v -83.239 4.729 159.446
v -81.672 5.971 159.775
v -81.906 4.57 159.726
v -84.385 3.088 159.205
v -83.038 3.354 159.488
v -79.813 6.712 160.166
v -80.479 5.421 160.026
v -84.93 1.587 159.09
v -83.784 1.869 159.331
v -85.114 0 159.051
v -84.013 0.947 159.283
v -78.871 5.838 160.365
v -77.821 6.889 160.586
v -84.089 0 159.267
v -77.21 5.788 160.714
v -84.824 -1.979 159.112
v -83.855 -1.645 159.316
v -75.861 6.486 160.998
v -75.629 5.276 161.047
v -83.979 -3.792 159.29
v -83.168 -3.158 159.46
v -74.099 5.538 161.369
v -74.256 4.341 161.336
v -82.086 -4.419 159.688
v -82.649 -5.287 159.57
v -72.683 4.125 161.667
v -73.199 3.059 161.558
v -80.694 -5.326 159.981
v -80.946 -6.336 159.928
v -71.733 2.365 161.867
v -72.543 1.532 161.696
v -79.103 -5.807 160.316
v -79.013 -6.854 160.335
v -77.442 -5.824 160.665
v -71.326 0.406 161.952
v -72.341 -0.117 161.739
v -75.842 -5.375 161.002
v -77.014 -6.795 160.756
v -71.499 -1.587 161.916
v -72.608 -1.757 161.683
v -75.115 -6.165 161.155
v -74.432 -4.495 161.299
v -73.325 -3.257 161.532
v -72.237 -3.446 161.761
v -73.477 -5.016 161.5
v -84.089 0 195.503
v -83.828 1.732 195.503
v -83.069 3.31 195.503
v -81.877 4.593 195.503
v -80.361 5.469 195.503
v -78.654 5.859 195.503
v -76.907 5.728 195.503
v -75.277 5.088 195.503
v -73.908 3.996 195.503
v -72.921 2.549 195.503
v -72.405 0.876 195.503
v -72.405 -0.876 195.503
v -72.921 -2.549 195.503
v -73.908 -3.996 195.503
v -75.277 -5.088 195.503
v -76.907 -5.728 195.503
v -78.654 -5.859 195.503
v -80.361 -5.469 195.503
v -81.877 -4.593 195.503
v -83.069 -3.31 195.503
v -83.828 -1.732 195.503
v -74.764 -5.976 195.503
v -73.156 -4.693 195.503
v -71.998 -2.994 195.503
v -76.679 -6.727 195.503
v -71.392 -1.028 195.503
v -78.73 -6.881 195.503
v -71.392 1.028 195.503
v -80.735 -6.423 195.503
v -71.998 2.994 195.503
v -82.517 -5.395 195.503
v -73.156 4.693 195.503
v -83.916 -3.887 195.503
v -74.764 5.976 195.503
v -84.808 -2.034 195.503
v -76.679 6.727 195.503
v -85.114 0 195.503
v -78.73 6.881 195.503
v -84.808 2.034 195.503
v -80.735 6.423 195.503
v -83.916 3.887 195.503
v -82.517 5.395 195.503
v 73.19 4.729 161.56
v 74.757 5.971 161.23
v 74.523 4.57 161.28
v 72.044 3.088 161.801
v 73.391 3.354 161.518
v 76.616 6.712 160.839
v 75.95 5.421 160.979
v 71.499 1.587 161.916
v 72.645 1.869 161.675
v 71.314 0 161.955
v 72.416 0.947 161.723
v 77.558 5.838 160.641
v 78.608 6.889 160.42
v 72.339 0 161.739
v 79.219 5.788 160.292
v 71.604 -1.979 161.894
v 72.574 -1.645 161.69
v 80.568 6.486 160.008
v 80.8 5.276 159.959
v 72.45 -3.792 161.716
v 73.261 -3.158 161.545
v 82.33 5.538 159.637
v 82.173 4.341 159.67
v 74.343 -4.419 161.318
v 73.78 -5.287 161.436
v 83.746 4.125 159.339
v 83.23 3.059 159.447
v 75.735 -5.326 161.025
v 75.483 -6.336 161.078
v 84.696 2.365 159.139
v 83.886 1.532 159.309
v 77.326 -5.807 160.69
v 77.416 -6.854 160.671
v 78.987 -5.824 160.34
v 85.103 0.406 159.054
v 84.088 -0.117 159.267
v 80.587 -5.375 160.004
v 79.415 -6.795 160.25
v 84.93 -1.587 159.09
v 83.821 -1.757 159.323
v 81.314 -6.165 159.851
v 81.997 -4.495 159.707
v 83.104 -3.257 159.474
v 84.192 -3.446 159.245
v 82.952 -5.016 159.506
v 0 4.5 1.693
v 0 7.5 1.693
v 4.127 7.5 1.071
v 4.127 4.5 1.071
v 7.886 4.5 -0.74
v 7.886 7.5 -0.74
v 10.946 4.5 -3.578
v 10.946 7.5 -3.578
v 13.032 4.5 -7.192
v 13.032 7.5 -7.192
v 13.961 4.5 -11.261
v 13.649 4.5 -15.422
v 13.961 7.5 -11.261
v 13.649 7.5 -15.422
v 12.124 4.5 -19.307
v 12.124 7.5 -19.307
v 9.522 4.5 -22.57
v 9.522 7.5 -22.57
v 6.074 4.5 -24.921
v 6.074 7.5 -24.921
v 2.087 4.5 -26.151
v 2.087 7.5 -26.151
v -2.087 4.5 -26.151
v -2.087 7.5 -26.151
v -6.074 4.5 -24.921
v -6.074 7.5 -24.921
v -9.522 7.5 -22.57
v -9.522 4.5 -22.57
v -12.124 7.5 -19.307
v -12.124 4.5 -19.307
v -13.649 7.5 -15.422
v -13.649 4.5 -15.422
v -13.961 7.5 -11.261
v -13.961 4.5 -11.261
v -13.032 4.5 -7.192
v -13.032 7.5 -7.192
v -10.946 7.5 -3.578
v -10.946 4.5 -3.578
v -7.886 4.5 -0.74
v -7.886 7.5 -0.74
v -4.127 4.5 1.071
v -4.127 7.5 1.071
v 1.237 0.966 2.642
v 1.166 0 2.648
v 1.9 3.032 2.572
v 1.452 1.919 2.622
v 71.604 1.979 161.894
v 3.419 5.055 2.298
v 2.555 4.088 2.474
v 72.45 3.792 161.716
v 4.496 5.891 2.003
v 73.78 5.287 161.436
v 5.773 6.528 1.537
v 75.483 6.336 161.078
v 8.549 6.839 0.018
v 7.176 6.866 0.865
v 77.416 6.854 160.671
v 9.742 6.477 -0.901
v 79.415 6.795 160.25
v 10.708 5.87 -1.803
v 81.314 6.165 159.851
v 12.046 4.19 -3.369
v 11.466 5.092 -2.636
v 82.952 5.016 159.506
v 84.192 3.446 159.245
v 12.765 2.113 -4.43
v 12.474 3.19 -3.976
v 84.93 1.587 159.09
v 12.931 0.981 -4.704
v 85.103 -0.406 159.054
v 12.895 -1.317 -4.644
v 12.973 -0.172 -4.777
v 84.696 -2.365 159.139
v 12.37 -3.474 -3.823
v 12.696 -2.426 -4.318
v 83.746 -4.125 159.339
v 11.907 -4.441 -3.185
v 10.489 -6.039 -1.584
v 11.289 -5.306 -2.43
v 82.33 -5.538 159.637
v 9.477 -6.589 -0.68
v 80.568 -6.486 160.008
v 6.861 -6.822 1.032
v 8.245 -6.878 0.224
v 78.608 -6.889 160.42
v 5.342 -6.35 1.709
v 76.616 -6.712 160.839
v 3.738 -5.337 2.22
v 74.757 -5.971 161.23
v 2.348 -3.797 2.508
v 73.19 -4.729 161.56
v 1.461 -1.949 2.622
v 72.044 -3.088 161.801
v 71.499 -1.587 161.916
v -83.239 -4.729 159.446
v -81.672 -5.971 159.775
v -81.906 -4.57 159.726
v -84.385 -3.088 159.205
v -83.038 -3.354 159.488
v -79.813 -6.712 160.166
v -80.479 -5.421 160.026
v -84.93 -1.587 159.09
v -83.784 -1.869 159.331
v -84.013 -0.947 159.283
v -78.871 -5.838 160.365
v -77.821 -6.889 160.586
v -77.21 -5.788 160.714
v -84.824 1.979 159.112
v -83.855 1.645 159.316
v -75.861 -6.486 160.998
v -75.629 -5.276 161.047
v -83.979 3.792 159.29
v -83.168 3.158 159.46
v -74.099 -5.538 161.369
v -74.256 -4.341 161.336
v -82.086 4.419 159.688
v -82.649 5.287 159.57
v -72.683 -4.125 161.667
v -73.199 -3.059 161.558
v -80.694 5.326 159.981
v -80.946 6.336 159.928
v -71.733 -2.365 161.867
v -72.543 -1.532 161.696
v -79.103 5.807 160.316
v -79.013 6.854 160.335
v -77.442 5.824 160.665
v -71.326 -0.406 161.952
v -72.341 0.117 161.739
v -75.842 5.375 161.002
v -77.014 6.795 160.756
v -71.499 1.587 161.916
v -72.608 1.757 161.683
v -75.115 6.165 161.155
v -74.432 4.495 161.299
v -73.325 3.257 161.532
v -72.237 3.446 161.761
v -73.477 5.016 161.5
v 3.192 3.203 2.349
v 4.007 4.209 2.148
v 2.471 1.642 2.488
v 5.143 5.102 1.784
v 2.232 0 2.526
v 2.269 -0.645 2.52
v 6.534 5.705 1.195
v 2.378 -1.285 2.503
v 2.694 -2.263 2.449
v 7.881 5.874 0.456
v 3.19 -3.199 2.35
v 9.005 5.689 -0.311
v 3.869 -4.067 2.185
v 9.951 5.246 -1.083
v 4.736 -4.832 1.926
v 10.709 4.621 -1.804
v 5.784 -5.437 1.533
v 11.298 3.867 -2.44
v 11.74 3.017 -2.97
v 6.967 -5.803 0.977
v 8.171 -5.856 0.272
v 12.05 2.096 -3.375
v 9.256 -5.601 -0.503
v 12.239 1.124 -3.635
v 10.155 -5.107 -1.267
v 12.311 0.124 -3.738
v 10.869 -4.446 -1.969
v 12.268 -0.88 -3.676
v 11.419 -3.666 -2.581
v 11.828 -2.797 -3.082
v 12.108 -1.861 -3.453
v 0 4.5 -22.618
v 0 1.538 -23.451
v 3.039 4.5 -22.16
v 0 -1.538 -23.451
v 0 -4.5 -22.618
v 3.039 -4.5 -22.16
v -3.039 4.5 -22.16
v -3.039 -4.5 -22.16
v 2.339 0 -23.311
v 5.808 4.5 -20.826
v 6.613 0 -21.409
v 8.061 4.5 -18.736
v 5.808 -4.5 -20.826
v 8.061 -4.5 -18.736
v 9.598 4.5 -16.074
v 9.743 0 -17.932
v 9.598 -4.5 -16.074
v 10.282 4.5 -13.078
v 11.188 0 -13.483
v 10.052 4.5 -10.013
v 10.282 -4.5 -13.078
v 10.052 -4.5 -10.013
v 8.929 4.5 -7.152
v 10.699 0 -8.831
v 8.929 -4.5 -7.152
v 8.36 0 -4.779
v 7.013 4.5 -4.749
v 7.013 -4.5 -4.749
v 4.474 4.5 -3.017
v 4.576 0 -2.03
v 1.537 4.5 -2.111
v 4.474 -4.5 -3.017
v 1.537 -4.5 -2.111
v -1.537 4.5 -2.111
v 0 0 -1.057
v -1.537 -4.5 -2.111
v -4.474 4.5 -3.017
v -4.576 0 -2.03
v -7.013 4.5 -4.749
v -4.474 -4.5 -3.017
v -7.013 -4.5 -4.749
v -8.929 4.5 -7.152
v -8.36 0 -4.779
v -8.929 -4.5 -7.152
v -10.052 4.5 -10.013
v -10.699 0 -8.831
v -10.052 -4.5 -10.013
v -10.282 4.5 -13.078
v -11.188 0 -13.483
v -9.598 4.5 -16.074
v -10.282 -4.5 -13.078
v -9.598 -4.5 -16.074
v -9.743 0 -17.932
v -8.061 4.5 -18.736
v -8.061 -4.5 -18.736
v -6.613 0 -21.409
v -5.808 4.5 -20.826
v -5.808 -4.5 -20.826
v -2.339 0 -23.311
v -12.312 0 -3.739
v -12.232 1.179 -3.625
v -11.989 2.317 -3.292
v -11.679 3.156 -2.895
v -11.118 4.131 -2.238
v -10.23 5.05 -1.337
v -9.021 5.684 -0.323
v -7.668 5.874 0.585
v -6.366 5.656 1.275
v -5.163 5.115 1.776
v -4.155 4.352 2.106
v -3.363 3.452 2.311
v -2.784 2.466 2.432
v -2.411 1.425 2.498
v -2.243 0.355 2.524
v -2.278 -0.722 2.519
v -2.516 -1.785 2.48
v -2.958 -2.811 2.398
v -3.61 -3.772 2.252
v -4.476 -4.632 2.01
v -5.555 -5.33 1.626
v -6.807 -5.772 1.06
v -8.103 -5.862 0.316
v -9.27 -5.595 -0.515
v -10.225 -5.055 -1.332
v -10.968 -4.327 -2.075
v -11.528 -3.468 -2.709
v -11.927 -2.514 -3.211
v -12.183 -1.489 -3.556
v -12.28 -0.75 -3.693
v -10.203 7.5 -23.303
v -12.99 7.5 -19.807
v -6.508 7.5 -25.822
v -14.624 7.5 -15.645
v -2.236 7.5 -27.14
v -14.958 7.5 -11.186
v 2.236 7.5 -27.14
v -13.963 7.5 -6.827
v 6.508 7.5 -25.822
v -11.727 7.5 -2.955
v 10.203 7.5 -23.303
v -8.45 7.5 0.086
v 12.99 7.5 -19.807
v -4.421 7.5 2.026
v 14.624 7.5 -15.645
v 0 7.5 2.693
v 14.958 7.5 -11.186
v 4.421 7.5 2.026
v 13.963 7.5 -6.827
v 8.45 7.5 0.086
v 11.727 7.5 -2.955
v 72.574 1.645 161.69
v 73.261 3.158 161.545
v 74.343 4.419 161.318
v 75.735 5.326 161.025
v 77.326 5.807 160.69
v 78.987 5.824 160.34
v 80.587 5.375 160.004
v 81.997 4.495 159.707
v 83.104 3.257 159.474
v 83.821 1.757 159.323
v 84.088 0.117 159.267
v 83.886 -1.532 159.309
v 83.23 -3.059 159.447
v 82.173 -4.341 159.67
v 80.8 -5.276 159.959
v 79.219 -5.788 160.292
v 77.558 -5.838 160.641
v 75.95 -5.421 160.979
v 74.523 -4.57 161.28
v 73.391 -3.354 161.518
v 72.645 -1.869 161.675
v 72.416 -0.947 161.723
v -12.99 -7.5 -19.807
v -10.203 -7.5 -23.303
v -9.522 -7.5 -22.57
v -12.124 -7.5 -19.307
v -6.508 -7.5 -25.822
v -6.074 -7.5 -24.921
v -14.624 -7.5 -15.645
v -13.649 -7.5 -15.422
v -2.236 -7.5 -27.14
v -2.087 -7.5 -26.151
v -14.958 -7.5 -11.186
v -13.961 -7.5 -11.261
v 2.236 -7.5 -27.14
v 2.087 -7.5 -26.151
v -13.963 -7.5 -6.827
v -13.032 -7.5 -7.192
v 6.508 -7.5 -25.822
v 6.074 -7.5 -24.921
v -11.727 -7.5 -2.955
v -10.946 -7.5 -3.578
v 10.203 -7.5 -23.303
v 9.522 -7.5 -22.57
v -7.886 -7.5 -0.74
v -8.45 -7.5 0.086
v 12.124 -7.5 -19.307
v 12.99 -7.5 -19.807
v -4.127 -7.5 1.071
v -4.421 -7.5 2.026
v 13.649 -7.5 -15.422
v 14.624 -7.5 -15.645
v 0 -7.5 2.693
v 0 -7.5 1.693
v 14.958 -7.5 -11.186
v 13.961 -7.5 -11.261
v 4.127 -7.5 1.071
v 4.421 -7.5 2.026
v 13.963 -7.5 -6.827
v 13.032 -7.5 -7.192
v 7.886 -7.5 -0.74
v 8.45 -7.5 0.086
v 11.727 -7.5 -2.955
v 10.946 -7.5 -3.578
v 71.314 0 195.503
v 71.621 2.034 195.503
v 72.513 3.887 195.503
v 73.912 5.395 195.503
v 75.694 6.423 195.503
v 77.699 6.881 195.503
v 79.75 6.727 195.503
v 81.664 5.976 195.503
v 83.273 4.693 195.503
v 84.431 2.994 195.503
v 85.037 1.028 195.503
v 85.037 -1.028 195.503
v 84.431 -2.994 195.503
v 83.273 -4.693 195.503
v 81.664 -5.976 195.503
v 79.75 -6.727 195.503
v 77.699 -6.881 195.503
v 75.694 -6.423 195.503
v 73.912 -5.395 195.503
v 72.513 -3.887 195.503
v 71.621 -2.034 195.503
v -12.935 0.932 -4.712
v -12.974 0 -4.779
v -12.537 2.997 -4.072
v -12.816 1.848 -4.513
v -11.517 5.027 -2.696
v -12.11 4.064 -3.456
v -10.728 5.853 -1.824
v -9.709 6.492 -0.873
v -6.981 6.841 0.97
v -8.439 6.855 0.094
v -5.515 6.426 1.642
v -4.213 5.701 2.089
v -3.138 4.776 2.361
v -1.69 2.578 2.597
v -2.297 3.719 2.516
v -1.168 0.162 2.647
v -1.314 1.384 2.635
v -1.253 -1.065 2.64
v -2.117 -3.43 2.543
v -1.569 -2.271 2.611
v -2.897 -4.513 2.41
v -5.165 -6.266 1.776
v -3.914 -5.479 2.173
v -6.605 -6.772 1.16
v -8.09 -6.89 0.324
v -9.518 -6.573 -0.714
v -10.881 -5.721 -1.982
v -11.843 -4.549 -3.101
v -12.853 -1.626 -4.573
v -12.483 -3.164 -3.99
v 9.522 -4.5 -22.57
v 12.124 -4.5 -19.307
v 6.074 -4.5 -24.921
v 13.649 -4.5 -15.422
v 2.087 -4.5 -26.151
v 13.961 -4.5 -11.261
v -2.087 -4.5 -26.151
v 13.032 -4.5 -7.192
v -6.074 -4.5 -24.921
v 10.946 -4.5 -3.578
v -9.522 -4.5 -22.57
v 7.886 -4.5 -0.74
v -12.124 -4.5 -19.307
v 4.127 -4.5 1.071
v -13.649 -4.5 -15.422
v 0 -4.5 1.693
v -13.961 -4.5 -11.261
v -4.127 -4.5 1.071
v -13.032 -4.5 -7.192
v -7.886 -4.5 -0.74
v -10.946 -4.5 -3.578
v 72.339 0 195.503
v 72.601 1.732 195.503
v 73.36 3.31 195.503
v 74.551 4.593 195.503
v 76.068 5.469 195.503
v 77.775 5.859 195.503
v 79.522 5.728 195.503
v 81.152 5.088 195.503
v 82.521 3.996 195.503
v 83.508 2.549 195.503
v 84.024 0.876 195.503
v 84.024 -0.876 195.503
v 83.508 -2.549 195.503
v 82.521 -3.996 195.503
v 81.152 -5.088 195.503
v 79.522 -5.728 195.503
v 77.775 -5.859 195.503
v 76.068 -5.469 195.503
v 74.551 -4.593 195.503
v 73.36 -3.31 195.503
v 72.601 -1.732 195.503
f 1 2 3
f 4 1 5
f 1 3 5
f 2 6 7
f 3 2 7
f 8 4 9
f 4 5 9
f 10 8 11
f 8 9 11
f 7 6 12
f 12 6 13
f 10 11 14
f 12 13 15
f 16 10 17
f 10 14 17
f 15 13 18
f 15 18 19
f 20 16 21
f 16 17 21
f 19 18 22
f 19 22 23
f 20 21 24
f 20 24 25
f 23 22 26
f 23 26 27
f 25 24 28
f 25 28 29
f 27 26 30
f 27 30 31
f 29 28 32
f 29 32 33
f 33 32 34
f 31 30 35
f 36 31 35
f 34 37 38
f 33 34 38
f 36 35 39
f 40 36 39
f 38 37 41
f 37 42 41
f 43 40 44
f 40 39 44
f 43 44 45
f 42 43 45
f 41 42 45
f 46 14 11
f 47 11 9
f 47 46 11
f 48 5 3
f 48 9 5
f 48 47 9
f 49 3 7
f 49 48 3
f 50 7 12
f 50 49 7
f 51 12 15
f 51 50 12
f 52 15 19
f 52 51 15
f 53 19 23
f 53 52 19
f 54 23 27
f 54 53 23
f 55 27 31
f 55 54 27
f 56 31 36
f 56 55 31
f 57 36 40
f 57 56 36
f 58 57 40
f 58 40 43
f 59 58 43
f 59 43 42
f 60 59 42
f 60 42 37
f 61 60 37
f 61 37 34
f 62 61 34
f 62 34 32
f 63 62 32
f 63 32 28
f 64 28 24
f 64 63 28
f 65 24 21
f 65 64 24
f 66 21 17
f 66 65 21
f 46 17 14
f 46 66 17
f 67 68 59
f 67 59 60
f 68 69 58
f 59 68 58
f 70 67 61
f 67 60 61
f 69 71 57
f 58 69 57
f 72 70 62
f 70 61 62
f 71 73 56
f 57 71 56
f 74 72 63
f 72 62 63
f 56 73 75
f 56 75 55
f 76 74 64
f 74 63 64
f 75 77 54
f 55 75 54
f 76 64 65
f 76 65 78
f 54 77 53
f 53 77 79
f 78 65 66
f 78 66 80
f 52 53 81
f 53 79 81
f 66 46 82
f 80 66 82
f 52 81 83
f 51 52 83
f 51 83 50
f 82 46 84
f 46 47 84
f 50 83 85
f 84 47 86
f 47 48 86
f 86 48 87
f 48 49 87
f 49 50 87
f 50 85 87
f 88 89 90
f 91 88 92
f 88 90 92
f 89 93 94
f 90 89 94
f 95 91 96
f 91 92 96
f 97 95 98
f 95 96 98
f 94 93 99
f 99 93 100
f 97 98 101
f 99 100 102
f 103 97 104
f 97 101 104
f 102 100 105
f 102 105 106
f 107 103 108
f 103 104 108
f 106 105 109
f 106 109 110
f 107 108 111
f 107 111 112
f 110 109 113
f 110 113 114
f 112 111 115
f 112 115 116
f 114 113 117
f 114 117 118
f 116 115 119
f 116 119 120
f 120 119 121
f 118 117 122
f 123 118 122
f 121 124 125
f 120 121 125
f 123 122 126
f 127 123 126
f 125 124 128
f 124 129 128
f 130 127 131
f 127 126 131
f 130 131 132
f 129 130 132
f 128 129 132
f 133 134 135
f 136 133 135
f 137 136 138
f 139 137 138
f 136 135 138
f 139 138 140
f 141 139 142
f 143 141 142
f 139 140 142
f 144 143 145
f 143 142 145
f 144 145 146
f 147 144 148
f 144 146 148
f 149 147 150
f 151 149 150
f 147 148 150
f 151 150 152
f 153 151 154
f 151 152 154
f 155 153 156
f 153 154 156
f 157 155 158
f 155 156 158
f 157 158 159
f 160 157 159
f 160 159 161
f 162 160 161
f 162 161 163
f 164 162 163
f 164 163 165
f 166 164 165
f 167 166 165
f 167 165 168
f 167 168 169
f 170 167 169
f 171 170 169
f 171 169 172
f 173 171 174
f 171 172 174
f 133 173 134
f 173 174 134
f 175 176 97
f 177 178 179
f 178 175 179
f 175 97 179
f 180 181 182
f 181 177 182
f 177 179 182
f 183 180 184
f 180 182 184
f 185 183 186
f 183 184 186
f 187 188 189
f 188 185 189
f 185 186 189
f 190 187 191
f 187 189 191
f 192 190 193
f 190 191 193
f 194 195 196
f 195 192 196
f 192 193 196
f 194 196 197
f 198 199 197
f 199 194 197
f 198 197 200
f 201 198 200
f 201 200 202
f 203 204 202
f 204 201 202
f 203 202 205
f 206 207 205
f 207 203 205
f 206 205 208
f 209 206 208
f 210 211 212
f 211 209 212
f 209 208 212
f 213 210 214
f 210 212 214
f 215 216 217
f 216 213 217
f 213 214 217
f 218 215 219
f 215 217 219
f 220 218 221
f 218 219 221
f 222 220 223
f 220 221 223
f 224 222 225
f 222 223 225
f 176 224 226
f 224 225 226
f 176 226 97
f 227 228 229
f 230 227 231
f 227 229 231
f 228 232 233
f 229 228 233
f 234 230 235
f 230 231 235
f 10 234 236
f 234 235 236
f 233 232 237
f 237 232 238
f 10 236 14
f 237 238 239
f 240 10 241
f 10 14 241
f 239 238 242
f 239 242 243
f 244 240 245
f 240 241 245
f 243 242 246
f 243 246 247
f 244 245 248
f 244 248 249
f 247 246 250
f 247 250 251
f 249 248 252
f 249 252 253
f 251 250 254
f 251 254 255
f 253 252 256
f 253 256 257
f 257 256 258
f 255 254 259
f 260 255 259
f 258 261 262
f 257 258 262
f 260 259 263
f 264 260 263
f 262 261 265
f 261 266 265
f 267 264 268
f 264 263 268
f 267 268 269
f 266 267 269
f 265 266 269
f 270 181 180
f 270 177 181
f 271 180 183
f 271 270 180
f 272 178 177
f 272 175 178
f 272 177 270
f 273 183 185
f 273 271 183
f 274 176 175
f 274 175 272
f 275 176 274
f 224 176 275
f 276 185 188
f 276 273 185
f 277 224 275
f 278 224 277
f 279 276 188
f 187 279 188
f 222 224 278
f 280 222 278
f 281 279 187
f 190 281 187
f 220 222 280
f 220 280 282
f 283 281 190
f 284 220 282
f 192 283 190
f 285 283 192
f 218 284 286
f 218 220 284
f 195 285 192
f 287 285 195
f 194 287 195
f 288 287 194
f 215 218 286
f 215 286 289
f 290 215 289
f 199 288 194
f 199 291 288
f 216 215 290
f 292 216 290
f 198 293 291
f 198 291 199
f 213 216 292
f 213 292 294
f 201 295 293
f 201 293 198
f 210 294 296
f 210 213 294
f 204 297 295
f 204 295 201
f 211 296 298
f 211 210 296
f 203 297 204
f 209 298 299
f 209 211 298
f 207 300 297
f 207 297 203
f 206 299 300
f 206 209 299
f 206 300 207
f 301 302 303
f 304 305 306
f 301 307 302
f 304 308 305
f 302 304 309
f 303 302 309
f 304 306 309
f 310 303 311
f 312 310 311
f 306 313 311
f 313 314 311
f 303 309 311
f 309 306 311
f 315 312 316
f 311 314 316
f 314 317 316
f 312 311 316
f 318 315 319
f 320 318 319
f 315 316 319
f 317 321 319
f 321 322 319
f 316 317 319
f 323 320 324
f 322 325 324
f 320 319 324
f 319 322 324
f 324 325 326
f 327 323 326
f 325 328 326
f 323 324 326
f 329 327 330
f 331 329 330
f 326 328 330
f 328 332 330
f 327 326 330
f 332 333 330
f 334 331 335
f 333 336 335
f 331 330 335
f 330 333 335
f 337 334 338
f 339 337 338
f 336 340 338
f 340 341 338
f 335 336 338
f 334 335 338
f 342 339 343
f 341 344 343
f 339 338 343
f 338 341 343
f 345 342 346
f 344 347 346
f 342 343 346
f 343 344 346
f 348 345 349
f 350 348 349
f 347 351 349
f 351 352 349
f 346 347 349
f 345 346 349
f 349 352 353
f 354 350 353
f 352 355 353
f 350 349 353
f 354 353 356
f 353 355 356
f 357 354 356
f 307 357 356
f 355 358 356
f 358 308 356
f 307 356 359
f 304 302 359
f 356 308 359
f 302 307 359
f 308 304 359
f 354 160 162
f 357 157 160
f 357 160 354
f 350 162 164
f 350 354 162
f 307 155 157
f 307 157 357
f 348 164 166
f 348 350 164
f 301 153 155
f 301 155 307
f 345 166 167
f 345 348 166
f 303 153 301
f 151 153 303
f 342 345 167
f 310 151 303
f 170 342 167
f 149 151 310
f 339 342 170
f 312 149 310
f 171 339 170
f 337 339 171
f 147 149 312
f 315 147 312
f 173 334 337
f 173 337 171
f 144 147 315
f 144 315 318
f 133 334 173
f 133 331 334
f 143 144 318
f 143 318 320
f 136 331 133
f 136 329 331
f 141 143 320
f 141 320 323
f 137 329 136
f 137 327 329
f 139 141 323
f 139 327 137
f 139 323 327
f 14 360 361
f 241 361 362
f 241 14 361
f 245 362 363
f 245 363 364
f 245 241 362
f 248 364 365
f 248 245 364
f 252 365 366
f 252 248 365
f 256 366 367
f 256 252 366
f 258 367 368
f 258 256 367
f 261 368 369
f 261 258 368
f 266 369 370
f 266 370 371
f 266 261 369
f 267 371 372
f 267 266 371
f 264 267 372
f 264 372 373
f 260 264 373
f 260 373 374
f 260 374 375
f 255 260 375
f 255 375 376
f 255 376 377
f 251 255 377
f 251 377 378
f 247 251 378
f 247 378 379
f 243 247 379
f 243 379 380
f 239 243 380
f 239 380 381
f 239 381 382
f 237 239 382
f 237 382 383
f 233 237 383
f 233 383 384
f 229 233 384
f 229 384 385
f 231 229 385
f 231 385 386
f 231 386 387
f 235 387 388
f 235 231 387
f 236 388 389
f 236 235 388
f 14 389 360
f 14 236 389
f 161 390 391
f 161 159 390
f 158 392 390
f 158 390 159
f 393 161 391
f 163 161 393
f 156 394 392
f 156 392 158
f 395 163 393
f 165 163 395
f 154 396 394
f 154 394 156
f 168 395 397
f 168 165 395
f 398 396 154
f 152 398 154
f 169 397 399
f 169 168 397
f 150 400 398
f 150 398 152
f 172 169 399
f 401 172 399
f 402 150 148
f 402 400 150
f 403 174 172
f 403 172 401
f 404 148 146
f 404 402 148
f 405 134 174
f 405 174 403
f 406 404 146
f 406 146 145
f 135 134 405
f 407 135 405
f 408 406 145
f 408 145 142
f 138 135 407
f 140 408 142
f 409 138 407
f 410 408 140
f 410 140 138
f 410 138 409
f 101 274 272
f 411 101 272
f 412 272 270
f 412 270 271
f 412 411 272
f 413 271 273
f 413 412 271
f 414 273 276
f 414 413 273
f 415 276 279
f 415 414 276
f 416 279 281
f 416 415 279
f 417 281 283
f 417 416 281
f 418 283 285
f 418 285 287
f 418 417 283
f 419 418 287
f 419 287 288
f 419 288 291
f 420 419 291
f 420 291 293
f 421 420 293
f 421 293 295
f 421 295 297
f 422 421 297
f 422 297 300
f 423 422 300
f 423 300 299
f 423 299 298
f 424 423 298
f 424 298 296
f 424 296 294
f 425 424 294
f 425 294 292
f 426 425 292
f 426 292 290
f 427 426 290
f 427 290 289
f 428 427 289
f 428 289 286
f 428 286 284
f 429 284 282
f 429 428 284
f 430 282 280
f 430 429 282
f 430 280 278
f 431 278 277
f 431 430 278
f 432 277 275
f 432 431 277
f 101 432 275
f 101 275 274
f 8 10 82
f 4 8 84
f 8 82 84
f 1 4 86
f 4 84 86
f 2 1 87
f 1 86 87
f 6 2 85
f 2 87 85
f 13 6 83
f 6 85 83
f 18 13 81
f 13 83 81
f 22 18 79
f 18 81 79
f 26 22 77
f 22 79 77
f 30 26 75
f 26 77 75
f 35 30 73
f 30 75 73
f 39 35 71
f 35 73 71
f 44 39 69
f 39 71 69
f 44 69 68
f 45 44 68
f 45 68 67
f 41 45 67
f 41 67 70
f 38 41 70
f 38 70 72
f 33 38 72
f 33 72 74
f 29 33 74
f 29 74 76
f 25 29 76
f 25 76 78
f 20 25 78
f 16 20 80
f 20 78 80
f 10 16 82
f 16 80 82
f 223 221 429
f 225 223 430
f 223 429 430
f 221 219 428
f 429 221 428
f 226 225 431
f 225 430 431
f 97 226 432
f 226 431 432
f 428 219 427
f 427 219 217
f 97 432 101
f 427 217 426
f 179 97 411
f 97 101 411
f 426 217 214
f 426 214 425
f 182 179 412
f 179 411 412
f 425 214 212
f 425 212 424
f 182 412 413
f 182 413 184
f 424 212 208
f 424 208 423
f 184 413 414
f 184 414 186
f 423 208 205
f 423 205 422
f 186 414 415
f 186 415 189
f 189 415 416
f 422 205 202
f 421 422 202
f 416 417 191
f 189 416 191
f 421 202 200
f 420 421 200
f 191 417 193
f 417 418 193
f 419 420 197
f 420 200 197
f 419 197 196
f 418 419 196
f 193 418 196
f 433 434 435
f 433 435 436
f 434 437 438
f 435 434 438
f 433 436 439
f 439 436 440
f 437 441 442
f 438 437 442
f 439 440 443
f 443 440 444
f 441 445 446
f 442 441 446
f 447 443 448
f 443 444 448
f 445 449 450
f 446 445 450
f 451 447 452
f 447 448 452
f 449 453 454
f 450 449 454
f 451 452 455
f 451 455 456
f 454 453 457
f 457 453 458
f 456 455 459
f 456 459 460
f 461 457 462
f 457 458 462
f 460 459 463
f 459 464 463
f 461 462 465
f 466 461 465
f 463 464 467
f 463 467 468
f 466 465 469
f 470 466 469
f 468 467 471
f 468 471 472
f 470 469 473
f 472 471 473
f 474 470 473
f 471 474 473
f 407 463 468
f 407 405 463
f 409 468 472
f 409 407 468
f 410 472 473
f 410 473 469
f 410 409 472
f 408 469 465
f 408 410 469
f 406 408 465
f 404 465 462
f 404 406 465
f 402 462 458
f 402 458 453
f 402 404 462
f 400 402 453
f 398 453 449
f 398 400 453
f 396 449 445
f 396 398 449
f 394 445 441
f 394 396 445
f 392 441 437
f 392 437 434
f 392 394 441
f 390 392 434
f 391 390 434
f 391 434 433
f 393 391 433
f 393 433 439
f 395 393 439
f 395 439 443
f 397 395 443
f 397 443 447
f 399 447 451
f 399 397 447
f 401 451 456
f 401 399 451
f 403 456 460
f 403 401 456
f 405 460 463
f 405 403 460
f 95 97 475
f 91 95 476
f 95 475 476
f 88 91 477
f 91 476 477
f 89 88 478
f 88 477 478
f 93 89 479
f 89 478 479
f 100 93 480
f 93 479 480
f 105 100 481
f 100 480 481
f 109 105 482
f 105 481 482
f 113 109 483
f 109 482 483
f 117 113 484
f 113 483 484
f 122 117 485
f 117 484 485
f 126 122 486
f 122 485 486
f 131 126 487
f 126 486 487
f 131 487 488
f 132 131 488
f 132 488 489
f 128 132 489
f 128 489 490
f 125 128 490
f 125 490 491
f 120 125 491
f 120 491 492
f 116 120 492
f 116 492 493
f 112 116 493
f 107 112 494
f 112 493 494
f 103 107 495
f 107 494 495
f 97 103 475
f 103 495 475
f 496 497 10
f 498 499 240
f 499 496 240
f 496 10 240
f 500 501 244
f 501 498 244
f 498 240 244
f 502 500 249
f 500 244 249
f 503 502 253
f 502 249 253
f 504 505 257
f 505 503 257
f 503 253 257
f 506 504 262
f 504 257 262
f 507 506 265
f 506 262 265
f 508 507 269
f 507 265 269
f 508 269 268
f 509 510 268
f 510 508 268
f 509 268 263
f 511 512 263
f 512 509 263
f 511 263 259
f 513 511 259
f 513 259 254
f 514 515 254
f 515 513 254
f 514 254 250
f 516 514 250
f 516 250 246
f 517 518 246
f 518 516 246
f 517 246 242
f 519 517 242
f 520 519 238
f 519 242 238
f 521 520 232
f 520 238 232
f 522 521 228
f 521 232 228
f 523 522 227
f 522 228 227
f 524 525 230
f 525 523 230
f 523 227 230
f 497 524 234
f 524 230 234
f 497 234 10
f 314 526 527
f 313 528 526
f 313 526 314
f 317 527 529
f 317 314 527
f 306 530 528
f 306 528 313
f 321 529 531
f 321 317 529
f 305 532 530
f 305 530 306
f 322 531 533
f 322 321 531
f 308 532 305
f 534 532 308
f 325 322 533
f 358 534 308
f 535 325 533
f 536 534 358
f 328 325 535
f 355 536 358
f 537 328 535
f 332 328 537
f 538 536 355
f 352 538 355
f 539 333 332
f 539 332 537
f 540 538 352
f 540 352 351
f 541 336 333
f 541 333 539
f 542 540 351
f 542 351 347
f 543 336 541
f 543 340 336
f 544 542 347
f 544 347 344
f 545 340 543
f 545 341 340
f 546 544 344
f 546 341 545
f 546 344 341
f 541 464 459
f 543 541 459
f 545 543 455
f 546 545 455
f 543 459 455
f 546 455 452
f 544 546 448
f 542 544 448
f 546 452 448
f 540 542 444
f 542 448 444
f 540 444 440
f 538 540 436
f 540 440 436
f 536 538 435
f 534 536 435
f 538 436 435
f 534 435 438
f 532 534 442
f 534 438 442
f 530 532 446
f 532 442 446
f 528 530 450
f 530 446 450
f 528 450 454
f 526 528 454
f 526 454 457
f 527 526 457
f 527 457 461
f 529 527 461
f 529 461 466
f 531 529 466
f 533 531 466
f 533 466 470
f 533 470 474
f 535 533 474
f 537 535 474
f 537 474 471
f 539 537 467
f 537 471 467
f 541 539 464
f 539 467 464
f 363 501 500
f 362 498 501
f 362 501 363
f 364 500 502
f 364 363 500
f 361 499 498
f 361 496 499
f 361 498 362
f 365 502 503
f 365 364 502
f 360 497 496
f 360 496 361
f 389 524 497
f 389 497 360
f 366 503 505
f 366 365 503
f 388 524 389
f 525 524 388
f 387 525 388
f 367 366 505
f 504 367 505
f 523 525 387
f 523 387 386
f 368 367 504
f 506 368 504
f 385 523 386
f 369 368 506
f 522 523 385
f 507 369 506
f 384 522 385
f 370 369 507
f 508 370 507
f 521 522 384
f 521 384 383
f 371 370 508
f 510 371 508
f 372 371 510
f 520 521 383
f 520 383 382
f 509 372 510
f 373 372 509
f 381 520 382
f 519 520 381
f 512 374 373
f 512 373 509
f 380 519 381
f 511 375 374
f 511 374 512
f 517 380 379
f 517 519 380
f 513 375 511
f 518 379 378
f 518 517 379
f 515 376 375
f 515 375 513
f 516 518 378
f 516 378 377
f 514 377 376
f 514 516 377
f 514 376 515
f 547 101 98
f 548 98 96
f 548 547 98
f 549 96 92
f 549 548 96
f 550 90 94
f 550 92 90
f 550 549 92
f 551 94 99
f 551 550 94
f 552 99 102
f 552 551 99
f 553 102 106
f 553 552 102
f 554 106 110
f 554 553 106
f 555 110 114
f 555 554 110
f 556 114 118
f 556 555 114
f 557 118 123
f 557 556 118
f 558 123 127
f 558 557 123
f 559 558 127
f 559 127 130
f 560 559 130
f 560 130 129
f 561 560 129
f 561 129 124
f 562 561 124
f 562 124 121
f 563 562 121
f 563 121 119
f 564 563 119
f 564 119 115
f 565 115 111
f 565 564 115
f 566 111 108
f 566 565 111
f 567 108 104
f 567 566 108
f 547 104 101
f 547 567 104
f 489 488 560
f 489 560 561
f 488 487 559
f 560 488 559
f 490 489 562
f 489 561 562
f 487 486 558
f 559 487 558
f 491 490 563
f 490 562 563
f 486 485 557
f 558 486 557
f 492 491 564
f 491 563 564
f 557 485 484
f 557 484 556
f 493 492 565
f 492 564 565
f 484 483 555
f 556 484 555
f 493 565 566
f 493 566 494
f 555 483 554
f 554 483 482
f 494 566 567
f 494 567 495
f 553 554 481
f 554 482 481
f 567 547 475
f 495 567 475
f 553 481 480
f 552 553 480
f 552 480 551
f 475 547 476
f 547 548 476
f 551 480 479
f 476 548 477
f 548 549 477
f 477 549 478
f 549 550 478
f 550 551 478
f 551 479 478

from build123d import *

# Parameters (mm, degrees)
SKETCH1_ON_SEGMENT_1_R                  = 6.9
SKETCH1_ON_SEGMENT_1_R_2                = 5.875
CIRCULAR_TUBE_21_3_X_2_3_1_DEPTH        = 38.053290561
CIRCULAR_TUBE_21_3_X_2_3_1_2_DEPTH      = 178.412650039
CIRCULAR_TUBE_21_3_X_2_3_1_2_DEPTH_BACK = 3.053290561
SKETCH1_R                               = 6.9
SKETCH1_R_2                             = 5.875
SKETCH11_ON_SEGMENT_1_R                 = 6.9
SKETCH11_ON_SEGMENT_1_R_2               = 5.875
CIRCULAR_TUBE_21_3_X_2_3_2_DEPTH        = 38.053290561
CIRCULAR_TUBE_21_3_X_2_3_2_2_DEPTH      = 178.412650039
CIRCULAR_TUBE_21_3_X_2_3_2_2_DEPTH_BACK = 3.053290561
SKETCH11_R                              = 6.9
SKETCH11_R_2                            = 5.875
SKETCH_1_R                              = 15
EXTRUDE_1_DEPTH                         = 7.5
SKETCH_5_R                              = 14
CUT_EXTRUDE_1_DEPTH                     = 3
SKETCH_7_R                              = 14
CUT_EXTRUDE_2_DEPTH                     = 3
WELD_START                              = -8
WELD_TRIM_4_DEPTH                       = 16
WELD_TRIM_4_2_DEPTH                     = 16


with BuildPart() as part:
    # Sketch1 on segment 1 (carried to segment 1) → Circular tube 21.3 X 2.3(1) (new body)
    with BuildSketch(Plane(origin=(-78.21449332, 0, 195.502886979), x_dir=(-1, 0, 0), z_dir=(0, 0, -1))):
        Circle(SKETCH1_ON_SEGMENT_1_R)
        Circle(SKETCH1_ON_SEGMENT_1_R_2, mode=Mode.SUBTRACT)
    extrude(amount=CIRCULAR_TUBE_21_3_X_2_3_1_DEPTH)

    # Circular tube 21.3 X 2.3(1) mitre 1
    split(bisect_by=Plane(origin=(-78.21449332, 0, 160.502886979), x_dir=(0, -1, 0), z_dir=(-0.205910543, 0, 0.978570819)), keep=Keep.TOP)


with BuildPart() as body_2:
    # Sketch1 → Circular tube 21.3 X 2.3_1 2 (new, two sides: drawn at the far end of the back side and taken through both)
    with BuildSketch(Plane(origin=(-78.21449332, 0, 160.502886979), x_dir=(-0.9152016968098962, 0, -0.4029960969491974), z_dir=(0.4029960969491974, 0, -0.9152016968098962)).offset(-CIRCULAR_TUBE_21_3_X_2_3_1_2_DEPTH_BACK)):
        Circle(SKETCH1_R)
        Circle(SKETCH1_R_2, mode=Mode.SUBTRACT)
    extrude(amount=CIRCULAR_TUBE_21_3_X_2_3_1_2_DEPTH + CIRCULAR_TUBE_21_3_X_2_3_1_2_DEPTH_BACK)

    # Circular tube 21.3 X 2.3_1 2 mitre 1
    split(bisect_by=Plane(origin=(-78.21449332, 0, 160.502886979), x_dir=(0, 1, 0), z_dir=(0.205910543, 0, -0.978570819)), keep=Keep.TOP)


with BuildPart() as body_3:
    # Sketch11 on segment 1 (carried to segment 1) → Circular tube 21.3 X 2.3(2) (new body)
    with BuildSketch(Plane(origin=(78.21449332, 0, 195.502886979), x_dir=(-1, 0, 0), z_dir=(0, 0, -1))):
        Circle(SKETCH11_ON_SEGMENT_1_R)
        Circle(SKETCH11_ON_SEGMENT_1_R_2, mode=Mode.SUBTRACT)
    extrude(amount=CIRCULAR_TUBE_21_3_X_2_3_2_DEPTH)

    # Circular tube 21.3 X 2.3(2) mitre 1
    split(bisect_by=Plane(origin=(78.21449332, 0, 160.502886979), x_dir=(0, -1, 0), z_dir=(0.205910543, 0, 0.978570819)), keep=Keep.TOP)


with BuildPart() as body_4:
    # Sketch11 → Circular tube 21.3 X 2.3_2 2 (new, two sides: drawn at the far end of the back side and taken through both)
    with BuildSketch(Plane(origin=(78.21449332, 0, 160.502886979), x_dir=(-0.9152016968098962, 0, 0.40299609694919775), z_dir=(-0.40299609694919775, 0, -0.9152016968098962)).offset(-CIRCULAR_TUBE_21_3_X_2_3_2_2_DEPTH_BACK)):
        Circle(SKETCH11_R)
        Circle(SKETCH11_R_2, mode=Mode.SUBTRACT)
    extrude(amount=CIRCULAR_TUBE_21_3_X_2_3_2_2_DEPTH + CIRCULAR_TUBE_21_3_X_2_3_2_2_DEPTH_BACK)

    # Circular tube 21.3 X 2.3_2 2 mitre 1
    split(bisect_by=Plane(origin=(78.21449332, 0, 160.502886979), x_dir=(0, 1, 0), z_dir=(-0.205910543, 0, -0.978570819)), keep=Keep.TOP)


with BuildPart() as body_5:
    # 스케치1 → 보스-돌출1 (new, symmetric)
    with BuildSketch(Plane(origin=(0, 0, 0), x_dir=(1, 0, 0), z_dir=(0, 1, 0))):
        with Locations(Location((0, 12.307113021, 0), (0, 0, 270))):
            Circle(SKETCH_1_R)
    extrude(amount=EXTRUDE_1_DEPTH, both=True)


with BuildPart() as cut_extrude_1_tool:
    # 스케치5 → 컷-돌출1 (new body)
    with BuildSketch(Plane(origin=(0, 7.5, 0), x_dir=(1, 0, 0), z_dir=(0, 1, 0))):
        with Locations(Location((0, 12.307113021, 0), (0, 0, 270))):
            Circle(SKETCH_5_R)
    extrude(amount=-CUT_EXTRUDE_1_DEPTH)


with BuildPart() as body_2_1:
    add(body_2.part)

    # 컷-돌출1: cut by cut_extrude_1_tool
    add(cut_extrude_1_tool.part, mode=Mode.SUBTRACT)


with BuildPart() as body_4_1:
    add(body_4.part)

    # 컷-돌출1: cut by cut_extrude_1_tool
    add(cut_extrude_1_tool.part, mode=Mode.SUBTRACT)


with BuildPart() as body_5_1:
    add(body_5.part)

    # 컷-돌출1: cut by cut_extrude_1_tool
    add(cut_extrude_1_tool.part, mode=Mode.SUBTRACT)


with BuildPart() as cut_extrude_2_tool:
    # 스케치7 → 컷-돌출2 (new body)
    with BuildSketch(Plane.XZ.offset(7.5)):
        with Locations(Location((0, -12.307113021, 0), (0, 0, 90))):
            Circle(SKETCH_7_R)
    extrude(amount=-CUT_EXTRUDE_2_DEPTH)


with BuildPart() as body_2_2:
    add(body_2_1.part)

    # 컷-돌출2: cut by cut_extrude_2_tool
    add(cut_extrude_2_tool.part, mode=Mode.SUBTRACT)

    # Weld Trim 4 2 outline → Weld Trim 4 2 (cut)
    with BuildSketch(Plane(origin=(0, 0, 0), x_dir=(1, 0, 0), z_dir=(0, 1, 0)).offset(WELD_START)):
        with BuildLine():
            ThreePointArc((-12.974565083, 4.779785413), (-7.986153794, -0.39018384), (-1.165795873, -2.647515694))
            Line((-1.165795873, -2.647515694), (1, -2.81635144))
            Line((1, -2.81635144), (1, -0.440335828))
            Line((1, -0.440335828), (0, 0))
            Line((0, 0), (-2.858187499, 1.258562359))
            Line((-2.858187499, 1.258562359), (-9.771595917, 4.302783779))
            Line((-9.771595917, 4.302783779), (-12.629783416, 5.561346138))
            Line((-12.629783416, 5.561346138), (-13.701878842, 6.033428165))
            Line((-13.701878842, 6.033428165), (-12.974565083, 4.779785413))
        make_face()
    extrude(amount=WELD_TRIM_4_2_DEPTH, mode=Mode.SUBTRACT)


with BuildPart() as body_4_2:
    add(body_4_1.part)

    # 컷-돌출2: cut by cut_extrude_2_tool
    add(cut_extrude_2_tool.part, mode=Mode.SUBTRACT)

    # Weld Trim 4: read off the stored shape, not the designer's step
    # Weld Trim 4 outline → Weld Trim 4 (cut)
    with BuildSketch(Plane(origin=(0, 0, 0), x_dir=(1, 0, 0), z_dir=(0, 1, 0)).offset(WELD_START)):
        with BuildLine():
            ThreePointArc((1.165186055, -2.64756322), (7.985591704, -0.390537358), (12.974205579, 4.779165784))
            Line((12.974205579, 4.779165784), (13.701986356, 6.033475507))
            Line((13.701986356, 6.033475507), (12.629783416, 5.561346138))
            Line((12.629783416, 5.561346138), (9.771595917, 4.302783779))
            Line((9.771595917, 4.302783779), (2.858187499, 1.258562359))
            Line((2.858187499, 1.258562359), (0, 0))
            Line((0, 0), (-1, -0.440335828))
            Line((-1, -0.440335828), (-1, -2.816262599))
            Line((-1, -2.816262599), (1.165186055, -2.64756322))
        make_face()
    extrude(amount=WELD_TRIM_4_DEPTH, mode=Mode.SUBTRACT)


with BuildPart() as body_5_2:
    add(body_5_1.part)

    # 컷-돌출2: cut by cut_extrude_2_tool
    add(cut_extrude_2_tool.part, mode=Mode.SUBTRACT)

    # 스케치9 → 컷-회전1 (revolve, cut)
    with BuildSketch(Plane(origin=(0, 0, 0), x_dir=(0, 0, -1), z_dir=(1, 0, 0))):
        with BuildLine():
            Line((12.307113021, -11.25), (12.307113021, 11.25))
            ThreePointArc((12.307113021, 11.25), (23.557113021, 0), (12.307113021, -11.25))
        make_face()
    revolve(axis=Axis((0, 7.5, -12.307113021), (0, -1, 0)), mode=Mode.SUBTRACT)


solid = Compound([part.part, body_3.part, body_2_2.part, body_4_2.part, body_5_2.part])
